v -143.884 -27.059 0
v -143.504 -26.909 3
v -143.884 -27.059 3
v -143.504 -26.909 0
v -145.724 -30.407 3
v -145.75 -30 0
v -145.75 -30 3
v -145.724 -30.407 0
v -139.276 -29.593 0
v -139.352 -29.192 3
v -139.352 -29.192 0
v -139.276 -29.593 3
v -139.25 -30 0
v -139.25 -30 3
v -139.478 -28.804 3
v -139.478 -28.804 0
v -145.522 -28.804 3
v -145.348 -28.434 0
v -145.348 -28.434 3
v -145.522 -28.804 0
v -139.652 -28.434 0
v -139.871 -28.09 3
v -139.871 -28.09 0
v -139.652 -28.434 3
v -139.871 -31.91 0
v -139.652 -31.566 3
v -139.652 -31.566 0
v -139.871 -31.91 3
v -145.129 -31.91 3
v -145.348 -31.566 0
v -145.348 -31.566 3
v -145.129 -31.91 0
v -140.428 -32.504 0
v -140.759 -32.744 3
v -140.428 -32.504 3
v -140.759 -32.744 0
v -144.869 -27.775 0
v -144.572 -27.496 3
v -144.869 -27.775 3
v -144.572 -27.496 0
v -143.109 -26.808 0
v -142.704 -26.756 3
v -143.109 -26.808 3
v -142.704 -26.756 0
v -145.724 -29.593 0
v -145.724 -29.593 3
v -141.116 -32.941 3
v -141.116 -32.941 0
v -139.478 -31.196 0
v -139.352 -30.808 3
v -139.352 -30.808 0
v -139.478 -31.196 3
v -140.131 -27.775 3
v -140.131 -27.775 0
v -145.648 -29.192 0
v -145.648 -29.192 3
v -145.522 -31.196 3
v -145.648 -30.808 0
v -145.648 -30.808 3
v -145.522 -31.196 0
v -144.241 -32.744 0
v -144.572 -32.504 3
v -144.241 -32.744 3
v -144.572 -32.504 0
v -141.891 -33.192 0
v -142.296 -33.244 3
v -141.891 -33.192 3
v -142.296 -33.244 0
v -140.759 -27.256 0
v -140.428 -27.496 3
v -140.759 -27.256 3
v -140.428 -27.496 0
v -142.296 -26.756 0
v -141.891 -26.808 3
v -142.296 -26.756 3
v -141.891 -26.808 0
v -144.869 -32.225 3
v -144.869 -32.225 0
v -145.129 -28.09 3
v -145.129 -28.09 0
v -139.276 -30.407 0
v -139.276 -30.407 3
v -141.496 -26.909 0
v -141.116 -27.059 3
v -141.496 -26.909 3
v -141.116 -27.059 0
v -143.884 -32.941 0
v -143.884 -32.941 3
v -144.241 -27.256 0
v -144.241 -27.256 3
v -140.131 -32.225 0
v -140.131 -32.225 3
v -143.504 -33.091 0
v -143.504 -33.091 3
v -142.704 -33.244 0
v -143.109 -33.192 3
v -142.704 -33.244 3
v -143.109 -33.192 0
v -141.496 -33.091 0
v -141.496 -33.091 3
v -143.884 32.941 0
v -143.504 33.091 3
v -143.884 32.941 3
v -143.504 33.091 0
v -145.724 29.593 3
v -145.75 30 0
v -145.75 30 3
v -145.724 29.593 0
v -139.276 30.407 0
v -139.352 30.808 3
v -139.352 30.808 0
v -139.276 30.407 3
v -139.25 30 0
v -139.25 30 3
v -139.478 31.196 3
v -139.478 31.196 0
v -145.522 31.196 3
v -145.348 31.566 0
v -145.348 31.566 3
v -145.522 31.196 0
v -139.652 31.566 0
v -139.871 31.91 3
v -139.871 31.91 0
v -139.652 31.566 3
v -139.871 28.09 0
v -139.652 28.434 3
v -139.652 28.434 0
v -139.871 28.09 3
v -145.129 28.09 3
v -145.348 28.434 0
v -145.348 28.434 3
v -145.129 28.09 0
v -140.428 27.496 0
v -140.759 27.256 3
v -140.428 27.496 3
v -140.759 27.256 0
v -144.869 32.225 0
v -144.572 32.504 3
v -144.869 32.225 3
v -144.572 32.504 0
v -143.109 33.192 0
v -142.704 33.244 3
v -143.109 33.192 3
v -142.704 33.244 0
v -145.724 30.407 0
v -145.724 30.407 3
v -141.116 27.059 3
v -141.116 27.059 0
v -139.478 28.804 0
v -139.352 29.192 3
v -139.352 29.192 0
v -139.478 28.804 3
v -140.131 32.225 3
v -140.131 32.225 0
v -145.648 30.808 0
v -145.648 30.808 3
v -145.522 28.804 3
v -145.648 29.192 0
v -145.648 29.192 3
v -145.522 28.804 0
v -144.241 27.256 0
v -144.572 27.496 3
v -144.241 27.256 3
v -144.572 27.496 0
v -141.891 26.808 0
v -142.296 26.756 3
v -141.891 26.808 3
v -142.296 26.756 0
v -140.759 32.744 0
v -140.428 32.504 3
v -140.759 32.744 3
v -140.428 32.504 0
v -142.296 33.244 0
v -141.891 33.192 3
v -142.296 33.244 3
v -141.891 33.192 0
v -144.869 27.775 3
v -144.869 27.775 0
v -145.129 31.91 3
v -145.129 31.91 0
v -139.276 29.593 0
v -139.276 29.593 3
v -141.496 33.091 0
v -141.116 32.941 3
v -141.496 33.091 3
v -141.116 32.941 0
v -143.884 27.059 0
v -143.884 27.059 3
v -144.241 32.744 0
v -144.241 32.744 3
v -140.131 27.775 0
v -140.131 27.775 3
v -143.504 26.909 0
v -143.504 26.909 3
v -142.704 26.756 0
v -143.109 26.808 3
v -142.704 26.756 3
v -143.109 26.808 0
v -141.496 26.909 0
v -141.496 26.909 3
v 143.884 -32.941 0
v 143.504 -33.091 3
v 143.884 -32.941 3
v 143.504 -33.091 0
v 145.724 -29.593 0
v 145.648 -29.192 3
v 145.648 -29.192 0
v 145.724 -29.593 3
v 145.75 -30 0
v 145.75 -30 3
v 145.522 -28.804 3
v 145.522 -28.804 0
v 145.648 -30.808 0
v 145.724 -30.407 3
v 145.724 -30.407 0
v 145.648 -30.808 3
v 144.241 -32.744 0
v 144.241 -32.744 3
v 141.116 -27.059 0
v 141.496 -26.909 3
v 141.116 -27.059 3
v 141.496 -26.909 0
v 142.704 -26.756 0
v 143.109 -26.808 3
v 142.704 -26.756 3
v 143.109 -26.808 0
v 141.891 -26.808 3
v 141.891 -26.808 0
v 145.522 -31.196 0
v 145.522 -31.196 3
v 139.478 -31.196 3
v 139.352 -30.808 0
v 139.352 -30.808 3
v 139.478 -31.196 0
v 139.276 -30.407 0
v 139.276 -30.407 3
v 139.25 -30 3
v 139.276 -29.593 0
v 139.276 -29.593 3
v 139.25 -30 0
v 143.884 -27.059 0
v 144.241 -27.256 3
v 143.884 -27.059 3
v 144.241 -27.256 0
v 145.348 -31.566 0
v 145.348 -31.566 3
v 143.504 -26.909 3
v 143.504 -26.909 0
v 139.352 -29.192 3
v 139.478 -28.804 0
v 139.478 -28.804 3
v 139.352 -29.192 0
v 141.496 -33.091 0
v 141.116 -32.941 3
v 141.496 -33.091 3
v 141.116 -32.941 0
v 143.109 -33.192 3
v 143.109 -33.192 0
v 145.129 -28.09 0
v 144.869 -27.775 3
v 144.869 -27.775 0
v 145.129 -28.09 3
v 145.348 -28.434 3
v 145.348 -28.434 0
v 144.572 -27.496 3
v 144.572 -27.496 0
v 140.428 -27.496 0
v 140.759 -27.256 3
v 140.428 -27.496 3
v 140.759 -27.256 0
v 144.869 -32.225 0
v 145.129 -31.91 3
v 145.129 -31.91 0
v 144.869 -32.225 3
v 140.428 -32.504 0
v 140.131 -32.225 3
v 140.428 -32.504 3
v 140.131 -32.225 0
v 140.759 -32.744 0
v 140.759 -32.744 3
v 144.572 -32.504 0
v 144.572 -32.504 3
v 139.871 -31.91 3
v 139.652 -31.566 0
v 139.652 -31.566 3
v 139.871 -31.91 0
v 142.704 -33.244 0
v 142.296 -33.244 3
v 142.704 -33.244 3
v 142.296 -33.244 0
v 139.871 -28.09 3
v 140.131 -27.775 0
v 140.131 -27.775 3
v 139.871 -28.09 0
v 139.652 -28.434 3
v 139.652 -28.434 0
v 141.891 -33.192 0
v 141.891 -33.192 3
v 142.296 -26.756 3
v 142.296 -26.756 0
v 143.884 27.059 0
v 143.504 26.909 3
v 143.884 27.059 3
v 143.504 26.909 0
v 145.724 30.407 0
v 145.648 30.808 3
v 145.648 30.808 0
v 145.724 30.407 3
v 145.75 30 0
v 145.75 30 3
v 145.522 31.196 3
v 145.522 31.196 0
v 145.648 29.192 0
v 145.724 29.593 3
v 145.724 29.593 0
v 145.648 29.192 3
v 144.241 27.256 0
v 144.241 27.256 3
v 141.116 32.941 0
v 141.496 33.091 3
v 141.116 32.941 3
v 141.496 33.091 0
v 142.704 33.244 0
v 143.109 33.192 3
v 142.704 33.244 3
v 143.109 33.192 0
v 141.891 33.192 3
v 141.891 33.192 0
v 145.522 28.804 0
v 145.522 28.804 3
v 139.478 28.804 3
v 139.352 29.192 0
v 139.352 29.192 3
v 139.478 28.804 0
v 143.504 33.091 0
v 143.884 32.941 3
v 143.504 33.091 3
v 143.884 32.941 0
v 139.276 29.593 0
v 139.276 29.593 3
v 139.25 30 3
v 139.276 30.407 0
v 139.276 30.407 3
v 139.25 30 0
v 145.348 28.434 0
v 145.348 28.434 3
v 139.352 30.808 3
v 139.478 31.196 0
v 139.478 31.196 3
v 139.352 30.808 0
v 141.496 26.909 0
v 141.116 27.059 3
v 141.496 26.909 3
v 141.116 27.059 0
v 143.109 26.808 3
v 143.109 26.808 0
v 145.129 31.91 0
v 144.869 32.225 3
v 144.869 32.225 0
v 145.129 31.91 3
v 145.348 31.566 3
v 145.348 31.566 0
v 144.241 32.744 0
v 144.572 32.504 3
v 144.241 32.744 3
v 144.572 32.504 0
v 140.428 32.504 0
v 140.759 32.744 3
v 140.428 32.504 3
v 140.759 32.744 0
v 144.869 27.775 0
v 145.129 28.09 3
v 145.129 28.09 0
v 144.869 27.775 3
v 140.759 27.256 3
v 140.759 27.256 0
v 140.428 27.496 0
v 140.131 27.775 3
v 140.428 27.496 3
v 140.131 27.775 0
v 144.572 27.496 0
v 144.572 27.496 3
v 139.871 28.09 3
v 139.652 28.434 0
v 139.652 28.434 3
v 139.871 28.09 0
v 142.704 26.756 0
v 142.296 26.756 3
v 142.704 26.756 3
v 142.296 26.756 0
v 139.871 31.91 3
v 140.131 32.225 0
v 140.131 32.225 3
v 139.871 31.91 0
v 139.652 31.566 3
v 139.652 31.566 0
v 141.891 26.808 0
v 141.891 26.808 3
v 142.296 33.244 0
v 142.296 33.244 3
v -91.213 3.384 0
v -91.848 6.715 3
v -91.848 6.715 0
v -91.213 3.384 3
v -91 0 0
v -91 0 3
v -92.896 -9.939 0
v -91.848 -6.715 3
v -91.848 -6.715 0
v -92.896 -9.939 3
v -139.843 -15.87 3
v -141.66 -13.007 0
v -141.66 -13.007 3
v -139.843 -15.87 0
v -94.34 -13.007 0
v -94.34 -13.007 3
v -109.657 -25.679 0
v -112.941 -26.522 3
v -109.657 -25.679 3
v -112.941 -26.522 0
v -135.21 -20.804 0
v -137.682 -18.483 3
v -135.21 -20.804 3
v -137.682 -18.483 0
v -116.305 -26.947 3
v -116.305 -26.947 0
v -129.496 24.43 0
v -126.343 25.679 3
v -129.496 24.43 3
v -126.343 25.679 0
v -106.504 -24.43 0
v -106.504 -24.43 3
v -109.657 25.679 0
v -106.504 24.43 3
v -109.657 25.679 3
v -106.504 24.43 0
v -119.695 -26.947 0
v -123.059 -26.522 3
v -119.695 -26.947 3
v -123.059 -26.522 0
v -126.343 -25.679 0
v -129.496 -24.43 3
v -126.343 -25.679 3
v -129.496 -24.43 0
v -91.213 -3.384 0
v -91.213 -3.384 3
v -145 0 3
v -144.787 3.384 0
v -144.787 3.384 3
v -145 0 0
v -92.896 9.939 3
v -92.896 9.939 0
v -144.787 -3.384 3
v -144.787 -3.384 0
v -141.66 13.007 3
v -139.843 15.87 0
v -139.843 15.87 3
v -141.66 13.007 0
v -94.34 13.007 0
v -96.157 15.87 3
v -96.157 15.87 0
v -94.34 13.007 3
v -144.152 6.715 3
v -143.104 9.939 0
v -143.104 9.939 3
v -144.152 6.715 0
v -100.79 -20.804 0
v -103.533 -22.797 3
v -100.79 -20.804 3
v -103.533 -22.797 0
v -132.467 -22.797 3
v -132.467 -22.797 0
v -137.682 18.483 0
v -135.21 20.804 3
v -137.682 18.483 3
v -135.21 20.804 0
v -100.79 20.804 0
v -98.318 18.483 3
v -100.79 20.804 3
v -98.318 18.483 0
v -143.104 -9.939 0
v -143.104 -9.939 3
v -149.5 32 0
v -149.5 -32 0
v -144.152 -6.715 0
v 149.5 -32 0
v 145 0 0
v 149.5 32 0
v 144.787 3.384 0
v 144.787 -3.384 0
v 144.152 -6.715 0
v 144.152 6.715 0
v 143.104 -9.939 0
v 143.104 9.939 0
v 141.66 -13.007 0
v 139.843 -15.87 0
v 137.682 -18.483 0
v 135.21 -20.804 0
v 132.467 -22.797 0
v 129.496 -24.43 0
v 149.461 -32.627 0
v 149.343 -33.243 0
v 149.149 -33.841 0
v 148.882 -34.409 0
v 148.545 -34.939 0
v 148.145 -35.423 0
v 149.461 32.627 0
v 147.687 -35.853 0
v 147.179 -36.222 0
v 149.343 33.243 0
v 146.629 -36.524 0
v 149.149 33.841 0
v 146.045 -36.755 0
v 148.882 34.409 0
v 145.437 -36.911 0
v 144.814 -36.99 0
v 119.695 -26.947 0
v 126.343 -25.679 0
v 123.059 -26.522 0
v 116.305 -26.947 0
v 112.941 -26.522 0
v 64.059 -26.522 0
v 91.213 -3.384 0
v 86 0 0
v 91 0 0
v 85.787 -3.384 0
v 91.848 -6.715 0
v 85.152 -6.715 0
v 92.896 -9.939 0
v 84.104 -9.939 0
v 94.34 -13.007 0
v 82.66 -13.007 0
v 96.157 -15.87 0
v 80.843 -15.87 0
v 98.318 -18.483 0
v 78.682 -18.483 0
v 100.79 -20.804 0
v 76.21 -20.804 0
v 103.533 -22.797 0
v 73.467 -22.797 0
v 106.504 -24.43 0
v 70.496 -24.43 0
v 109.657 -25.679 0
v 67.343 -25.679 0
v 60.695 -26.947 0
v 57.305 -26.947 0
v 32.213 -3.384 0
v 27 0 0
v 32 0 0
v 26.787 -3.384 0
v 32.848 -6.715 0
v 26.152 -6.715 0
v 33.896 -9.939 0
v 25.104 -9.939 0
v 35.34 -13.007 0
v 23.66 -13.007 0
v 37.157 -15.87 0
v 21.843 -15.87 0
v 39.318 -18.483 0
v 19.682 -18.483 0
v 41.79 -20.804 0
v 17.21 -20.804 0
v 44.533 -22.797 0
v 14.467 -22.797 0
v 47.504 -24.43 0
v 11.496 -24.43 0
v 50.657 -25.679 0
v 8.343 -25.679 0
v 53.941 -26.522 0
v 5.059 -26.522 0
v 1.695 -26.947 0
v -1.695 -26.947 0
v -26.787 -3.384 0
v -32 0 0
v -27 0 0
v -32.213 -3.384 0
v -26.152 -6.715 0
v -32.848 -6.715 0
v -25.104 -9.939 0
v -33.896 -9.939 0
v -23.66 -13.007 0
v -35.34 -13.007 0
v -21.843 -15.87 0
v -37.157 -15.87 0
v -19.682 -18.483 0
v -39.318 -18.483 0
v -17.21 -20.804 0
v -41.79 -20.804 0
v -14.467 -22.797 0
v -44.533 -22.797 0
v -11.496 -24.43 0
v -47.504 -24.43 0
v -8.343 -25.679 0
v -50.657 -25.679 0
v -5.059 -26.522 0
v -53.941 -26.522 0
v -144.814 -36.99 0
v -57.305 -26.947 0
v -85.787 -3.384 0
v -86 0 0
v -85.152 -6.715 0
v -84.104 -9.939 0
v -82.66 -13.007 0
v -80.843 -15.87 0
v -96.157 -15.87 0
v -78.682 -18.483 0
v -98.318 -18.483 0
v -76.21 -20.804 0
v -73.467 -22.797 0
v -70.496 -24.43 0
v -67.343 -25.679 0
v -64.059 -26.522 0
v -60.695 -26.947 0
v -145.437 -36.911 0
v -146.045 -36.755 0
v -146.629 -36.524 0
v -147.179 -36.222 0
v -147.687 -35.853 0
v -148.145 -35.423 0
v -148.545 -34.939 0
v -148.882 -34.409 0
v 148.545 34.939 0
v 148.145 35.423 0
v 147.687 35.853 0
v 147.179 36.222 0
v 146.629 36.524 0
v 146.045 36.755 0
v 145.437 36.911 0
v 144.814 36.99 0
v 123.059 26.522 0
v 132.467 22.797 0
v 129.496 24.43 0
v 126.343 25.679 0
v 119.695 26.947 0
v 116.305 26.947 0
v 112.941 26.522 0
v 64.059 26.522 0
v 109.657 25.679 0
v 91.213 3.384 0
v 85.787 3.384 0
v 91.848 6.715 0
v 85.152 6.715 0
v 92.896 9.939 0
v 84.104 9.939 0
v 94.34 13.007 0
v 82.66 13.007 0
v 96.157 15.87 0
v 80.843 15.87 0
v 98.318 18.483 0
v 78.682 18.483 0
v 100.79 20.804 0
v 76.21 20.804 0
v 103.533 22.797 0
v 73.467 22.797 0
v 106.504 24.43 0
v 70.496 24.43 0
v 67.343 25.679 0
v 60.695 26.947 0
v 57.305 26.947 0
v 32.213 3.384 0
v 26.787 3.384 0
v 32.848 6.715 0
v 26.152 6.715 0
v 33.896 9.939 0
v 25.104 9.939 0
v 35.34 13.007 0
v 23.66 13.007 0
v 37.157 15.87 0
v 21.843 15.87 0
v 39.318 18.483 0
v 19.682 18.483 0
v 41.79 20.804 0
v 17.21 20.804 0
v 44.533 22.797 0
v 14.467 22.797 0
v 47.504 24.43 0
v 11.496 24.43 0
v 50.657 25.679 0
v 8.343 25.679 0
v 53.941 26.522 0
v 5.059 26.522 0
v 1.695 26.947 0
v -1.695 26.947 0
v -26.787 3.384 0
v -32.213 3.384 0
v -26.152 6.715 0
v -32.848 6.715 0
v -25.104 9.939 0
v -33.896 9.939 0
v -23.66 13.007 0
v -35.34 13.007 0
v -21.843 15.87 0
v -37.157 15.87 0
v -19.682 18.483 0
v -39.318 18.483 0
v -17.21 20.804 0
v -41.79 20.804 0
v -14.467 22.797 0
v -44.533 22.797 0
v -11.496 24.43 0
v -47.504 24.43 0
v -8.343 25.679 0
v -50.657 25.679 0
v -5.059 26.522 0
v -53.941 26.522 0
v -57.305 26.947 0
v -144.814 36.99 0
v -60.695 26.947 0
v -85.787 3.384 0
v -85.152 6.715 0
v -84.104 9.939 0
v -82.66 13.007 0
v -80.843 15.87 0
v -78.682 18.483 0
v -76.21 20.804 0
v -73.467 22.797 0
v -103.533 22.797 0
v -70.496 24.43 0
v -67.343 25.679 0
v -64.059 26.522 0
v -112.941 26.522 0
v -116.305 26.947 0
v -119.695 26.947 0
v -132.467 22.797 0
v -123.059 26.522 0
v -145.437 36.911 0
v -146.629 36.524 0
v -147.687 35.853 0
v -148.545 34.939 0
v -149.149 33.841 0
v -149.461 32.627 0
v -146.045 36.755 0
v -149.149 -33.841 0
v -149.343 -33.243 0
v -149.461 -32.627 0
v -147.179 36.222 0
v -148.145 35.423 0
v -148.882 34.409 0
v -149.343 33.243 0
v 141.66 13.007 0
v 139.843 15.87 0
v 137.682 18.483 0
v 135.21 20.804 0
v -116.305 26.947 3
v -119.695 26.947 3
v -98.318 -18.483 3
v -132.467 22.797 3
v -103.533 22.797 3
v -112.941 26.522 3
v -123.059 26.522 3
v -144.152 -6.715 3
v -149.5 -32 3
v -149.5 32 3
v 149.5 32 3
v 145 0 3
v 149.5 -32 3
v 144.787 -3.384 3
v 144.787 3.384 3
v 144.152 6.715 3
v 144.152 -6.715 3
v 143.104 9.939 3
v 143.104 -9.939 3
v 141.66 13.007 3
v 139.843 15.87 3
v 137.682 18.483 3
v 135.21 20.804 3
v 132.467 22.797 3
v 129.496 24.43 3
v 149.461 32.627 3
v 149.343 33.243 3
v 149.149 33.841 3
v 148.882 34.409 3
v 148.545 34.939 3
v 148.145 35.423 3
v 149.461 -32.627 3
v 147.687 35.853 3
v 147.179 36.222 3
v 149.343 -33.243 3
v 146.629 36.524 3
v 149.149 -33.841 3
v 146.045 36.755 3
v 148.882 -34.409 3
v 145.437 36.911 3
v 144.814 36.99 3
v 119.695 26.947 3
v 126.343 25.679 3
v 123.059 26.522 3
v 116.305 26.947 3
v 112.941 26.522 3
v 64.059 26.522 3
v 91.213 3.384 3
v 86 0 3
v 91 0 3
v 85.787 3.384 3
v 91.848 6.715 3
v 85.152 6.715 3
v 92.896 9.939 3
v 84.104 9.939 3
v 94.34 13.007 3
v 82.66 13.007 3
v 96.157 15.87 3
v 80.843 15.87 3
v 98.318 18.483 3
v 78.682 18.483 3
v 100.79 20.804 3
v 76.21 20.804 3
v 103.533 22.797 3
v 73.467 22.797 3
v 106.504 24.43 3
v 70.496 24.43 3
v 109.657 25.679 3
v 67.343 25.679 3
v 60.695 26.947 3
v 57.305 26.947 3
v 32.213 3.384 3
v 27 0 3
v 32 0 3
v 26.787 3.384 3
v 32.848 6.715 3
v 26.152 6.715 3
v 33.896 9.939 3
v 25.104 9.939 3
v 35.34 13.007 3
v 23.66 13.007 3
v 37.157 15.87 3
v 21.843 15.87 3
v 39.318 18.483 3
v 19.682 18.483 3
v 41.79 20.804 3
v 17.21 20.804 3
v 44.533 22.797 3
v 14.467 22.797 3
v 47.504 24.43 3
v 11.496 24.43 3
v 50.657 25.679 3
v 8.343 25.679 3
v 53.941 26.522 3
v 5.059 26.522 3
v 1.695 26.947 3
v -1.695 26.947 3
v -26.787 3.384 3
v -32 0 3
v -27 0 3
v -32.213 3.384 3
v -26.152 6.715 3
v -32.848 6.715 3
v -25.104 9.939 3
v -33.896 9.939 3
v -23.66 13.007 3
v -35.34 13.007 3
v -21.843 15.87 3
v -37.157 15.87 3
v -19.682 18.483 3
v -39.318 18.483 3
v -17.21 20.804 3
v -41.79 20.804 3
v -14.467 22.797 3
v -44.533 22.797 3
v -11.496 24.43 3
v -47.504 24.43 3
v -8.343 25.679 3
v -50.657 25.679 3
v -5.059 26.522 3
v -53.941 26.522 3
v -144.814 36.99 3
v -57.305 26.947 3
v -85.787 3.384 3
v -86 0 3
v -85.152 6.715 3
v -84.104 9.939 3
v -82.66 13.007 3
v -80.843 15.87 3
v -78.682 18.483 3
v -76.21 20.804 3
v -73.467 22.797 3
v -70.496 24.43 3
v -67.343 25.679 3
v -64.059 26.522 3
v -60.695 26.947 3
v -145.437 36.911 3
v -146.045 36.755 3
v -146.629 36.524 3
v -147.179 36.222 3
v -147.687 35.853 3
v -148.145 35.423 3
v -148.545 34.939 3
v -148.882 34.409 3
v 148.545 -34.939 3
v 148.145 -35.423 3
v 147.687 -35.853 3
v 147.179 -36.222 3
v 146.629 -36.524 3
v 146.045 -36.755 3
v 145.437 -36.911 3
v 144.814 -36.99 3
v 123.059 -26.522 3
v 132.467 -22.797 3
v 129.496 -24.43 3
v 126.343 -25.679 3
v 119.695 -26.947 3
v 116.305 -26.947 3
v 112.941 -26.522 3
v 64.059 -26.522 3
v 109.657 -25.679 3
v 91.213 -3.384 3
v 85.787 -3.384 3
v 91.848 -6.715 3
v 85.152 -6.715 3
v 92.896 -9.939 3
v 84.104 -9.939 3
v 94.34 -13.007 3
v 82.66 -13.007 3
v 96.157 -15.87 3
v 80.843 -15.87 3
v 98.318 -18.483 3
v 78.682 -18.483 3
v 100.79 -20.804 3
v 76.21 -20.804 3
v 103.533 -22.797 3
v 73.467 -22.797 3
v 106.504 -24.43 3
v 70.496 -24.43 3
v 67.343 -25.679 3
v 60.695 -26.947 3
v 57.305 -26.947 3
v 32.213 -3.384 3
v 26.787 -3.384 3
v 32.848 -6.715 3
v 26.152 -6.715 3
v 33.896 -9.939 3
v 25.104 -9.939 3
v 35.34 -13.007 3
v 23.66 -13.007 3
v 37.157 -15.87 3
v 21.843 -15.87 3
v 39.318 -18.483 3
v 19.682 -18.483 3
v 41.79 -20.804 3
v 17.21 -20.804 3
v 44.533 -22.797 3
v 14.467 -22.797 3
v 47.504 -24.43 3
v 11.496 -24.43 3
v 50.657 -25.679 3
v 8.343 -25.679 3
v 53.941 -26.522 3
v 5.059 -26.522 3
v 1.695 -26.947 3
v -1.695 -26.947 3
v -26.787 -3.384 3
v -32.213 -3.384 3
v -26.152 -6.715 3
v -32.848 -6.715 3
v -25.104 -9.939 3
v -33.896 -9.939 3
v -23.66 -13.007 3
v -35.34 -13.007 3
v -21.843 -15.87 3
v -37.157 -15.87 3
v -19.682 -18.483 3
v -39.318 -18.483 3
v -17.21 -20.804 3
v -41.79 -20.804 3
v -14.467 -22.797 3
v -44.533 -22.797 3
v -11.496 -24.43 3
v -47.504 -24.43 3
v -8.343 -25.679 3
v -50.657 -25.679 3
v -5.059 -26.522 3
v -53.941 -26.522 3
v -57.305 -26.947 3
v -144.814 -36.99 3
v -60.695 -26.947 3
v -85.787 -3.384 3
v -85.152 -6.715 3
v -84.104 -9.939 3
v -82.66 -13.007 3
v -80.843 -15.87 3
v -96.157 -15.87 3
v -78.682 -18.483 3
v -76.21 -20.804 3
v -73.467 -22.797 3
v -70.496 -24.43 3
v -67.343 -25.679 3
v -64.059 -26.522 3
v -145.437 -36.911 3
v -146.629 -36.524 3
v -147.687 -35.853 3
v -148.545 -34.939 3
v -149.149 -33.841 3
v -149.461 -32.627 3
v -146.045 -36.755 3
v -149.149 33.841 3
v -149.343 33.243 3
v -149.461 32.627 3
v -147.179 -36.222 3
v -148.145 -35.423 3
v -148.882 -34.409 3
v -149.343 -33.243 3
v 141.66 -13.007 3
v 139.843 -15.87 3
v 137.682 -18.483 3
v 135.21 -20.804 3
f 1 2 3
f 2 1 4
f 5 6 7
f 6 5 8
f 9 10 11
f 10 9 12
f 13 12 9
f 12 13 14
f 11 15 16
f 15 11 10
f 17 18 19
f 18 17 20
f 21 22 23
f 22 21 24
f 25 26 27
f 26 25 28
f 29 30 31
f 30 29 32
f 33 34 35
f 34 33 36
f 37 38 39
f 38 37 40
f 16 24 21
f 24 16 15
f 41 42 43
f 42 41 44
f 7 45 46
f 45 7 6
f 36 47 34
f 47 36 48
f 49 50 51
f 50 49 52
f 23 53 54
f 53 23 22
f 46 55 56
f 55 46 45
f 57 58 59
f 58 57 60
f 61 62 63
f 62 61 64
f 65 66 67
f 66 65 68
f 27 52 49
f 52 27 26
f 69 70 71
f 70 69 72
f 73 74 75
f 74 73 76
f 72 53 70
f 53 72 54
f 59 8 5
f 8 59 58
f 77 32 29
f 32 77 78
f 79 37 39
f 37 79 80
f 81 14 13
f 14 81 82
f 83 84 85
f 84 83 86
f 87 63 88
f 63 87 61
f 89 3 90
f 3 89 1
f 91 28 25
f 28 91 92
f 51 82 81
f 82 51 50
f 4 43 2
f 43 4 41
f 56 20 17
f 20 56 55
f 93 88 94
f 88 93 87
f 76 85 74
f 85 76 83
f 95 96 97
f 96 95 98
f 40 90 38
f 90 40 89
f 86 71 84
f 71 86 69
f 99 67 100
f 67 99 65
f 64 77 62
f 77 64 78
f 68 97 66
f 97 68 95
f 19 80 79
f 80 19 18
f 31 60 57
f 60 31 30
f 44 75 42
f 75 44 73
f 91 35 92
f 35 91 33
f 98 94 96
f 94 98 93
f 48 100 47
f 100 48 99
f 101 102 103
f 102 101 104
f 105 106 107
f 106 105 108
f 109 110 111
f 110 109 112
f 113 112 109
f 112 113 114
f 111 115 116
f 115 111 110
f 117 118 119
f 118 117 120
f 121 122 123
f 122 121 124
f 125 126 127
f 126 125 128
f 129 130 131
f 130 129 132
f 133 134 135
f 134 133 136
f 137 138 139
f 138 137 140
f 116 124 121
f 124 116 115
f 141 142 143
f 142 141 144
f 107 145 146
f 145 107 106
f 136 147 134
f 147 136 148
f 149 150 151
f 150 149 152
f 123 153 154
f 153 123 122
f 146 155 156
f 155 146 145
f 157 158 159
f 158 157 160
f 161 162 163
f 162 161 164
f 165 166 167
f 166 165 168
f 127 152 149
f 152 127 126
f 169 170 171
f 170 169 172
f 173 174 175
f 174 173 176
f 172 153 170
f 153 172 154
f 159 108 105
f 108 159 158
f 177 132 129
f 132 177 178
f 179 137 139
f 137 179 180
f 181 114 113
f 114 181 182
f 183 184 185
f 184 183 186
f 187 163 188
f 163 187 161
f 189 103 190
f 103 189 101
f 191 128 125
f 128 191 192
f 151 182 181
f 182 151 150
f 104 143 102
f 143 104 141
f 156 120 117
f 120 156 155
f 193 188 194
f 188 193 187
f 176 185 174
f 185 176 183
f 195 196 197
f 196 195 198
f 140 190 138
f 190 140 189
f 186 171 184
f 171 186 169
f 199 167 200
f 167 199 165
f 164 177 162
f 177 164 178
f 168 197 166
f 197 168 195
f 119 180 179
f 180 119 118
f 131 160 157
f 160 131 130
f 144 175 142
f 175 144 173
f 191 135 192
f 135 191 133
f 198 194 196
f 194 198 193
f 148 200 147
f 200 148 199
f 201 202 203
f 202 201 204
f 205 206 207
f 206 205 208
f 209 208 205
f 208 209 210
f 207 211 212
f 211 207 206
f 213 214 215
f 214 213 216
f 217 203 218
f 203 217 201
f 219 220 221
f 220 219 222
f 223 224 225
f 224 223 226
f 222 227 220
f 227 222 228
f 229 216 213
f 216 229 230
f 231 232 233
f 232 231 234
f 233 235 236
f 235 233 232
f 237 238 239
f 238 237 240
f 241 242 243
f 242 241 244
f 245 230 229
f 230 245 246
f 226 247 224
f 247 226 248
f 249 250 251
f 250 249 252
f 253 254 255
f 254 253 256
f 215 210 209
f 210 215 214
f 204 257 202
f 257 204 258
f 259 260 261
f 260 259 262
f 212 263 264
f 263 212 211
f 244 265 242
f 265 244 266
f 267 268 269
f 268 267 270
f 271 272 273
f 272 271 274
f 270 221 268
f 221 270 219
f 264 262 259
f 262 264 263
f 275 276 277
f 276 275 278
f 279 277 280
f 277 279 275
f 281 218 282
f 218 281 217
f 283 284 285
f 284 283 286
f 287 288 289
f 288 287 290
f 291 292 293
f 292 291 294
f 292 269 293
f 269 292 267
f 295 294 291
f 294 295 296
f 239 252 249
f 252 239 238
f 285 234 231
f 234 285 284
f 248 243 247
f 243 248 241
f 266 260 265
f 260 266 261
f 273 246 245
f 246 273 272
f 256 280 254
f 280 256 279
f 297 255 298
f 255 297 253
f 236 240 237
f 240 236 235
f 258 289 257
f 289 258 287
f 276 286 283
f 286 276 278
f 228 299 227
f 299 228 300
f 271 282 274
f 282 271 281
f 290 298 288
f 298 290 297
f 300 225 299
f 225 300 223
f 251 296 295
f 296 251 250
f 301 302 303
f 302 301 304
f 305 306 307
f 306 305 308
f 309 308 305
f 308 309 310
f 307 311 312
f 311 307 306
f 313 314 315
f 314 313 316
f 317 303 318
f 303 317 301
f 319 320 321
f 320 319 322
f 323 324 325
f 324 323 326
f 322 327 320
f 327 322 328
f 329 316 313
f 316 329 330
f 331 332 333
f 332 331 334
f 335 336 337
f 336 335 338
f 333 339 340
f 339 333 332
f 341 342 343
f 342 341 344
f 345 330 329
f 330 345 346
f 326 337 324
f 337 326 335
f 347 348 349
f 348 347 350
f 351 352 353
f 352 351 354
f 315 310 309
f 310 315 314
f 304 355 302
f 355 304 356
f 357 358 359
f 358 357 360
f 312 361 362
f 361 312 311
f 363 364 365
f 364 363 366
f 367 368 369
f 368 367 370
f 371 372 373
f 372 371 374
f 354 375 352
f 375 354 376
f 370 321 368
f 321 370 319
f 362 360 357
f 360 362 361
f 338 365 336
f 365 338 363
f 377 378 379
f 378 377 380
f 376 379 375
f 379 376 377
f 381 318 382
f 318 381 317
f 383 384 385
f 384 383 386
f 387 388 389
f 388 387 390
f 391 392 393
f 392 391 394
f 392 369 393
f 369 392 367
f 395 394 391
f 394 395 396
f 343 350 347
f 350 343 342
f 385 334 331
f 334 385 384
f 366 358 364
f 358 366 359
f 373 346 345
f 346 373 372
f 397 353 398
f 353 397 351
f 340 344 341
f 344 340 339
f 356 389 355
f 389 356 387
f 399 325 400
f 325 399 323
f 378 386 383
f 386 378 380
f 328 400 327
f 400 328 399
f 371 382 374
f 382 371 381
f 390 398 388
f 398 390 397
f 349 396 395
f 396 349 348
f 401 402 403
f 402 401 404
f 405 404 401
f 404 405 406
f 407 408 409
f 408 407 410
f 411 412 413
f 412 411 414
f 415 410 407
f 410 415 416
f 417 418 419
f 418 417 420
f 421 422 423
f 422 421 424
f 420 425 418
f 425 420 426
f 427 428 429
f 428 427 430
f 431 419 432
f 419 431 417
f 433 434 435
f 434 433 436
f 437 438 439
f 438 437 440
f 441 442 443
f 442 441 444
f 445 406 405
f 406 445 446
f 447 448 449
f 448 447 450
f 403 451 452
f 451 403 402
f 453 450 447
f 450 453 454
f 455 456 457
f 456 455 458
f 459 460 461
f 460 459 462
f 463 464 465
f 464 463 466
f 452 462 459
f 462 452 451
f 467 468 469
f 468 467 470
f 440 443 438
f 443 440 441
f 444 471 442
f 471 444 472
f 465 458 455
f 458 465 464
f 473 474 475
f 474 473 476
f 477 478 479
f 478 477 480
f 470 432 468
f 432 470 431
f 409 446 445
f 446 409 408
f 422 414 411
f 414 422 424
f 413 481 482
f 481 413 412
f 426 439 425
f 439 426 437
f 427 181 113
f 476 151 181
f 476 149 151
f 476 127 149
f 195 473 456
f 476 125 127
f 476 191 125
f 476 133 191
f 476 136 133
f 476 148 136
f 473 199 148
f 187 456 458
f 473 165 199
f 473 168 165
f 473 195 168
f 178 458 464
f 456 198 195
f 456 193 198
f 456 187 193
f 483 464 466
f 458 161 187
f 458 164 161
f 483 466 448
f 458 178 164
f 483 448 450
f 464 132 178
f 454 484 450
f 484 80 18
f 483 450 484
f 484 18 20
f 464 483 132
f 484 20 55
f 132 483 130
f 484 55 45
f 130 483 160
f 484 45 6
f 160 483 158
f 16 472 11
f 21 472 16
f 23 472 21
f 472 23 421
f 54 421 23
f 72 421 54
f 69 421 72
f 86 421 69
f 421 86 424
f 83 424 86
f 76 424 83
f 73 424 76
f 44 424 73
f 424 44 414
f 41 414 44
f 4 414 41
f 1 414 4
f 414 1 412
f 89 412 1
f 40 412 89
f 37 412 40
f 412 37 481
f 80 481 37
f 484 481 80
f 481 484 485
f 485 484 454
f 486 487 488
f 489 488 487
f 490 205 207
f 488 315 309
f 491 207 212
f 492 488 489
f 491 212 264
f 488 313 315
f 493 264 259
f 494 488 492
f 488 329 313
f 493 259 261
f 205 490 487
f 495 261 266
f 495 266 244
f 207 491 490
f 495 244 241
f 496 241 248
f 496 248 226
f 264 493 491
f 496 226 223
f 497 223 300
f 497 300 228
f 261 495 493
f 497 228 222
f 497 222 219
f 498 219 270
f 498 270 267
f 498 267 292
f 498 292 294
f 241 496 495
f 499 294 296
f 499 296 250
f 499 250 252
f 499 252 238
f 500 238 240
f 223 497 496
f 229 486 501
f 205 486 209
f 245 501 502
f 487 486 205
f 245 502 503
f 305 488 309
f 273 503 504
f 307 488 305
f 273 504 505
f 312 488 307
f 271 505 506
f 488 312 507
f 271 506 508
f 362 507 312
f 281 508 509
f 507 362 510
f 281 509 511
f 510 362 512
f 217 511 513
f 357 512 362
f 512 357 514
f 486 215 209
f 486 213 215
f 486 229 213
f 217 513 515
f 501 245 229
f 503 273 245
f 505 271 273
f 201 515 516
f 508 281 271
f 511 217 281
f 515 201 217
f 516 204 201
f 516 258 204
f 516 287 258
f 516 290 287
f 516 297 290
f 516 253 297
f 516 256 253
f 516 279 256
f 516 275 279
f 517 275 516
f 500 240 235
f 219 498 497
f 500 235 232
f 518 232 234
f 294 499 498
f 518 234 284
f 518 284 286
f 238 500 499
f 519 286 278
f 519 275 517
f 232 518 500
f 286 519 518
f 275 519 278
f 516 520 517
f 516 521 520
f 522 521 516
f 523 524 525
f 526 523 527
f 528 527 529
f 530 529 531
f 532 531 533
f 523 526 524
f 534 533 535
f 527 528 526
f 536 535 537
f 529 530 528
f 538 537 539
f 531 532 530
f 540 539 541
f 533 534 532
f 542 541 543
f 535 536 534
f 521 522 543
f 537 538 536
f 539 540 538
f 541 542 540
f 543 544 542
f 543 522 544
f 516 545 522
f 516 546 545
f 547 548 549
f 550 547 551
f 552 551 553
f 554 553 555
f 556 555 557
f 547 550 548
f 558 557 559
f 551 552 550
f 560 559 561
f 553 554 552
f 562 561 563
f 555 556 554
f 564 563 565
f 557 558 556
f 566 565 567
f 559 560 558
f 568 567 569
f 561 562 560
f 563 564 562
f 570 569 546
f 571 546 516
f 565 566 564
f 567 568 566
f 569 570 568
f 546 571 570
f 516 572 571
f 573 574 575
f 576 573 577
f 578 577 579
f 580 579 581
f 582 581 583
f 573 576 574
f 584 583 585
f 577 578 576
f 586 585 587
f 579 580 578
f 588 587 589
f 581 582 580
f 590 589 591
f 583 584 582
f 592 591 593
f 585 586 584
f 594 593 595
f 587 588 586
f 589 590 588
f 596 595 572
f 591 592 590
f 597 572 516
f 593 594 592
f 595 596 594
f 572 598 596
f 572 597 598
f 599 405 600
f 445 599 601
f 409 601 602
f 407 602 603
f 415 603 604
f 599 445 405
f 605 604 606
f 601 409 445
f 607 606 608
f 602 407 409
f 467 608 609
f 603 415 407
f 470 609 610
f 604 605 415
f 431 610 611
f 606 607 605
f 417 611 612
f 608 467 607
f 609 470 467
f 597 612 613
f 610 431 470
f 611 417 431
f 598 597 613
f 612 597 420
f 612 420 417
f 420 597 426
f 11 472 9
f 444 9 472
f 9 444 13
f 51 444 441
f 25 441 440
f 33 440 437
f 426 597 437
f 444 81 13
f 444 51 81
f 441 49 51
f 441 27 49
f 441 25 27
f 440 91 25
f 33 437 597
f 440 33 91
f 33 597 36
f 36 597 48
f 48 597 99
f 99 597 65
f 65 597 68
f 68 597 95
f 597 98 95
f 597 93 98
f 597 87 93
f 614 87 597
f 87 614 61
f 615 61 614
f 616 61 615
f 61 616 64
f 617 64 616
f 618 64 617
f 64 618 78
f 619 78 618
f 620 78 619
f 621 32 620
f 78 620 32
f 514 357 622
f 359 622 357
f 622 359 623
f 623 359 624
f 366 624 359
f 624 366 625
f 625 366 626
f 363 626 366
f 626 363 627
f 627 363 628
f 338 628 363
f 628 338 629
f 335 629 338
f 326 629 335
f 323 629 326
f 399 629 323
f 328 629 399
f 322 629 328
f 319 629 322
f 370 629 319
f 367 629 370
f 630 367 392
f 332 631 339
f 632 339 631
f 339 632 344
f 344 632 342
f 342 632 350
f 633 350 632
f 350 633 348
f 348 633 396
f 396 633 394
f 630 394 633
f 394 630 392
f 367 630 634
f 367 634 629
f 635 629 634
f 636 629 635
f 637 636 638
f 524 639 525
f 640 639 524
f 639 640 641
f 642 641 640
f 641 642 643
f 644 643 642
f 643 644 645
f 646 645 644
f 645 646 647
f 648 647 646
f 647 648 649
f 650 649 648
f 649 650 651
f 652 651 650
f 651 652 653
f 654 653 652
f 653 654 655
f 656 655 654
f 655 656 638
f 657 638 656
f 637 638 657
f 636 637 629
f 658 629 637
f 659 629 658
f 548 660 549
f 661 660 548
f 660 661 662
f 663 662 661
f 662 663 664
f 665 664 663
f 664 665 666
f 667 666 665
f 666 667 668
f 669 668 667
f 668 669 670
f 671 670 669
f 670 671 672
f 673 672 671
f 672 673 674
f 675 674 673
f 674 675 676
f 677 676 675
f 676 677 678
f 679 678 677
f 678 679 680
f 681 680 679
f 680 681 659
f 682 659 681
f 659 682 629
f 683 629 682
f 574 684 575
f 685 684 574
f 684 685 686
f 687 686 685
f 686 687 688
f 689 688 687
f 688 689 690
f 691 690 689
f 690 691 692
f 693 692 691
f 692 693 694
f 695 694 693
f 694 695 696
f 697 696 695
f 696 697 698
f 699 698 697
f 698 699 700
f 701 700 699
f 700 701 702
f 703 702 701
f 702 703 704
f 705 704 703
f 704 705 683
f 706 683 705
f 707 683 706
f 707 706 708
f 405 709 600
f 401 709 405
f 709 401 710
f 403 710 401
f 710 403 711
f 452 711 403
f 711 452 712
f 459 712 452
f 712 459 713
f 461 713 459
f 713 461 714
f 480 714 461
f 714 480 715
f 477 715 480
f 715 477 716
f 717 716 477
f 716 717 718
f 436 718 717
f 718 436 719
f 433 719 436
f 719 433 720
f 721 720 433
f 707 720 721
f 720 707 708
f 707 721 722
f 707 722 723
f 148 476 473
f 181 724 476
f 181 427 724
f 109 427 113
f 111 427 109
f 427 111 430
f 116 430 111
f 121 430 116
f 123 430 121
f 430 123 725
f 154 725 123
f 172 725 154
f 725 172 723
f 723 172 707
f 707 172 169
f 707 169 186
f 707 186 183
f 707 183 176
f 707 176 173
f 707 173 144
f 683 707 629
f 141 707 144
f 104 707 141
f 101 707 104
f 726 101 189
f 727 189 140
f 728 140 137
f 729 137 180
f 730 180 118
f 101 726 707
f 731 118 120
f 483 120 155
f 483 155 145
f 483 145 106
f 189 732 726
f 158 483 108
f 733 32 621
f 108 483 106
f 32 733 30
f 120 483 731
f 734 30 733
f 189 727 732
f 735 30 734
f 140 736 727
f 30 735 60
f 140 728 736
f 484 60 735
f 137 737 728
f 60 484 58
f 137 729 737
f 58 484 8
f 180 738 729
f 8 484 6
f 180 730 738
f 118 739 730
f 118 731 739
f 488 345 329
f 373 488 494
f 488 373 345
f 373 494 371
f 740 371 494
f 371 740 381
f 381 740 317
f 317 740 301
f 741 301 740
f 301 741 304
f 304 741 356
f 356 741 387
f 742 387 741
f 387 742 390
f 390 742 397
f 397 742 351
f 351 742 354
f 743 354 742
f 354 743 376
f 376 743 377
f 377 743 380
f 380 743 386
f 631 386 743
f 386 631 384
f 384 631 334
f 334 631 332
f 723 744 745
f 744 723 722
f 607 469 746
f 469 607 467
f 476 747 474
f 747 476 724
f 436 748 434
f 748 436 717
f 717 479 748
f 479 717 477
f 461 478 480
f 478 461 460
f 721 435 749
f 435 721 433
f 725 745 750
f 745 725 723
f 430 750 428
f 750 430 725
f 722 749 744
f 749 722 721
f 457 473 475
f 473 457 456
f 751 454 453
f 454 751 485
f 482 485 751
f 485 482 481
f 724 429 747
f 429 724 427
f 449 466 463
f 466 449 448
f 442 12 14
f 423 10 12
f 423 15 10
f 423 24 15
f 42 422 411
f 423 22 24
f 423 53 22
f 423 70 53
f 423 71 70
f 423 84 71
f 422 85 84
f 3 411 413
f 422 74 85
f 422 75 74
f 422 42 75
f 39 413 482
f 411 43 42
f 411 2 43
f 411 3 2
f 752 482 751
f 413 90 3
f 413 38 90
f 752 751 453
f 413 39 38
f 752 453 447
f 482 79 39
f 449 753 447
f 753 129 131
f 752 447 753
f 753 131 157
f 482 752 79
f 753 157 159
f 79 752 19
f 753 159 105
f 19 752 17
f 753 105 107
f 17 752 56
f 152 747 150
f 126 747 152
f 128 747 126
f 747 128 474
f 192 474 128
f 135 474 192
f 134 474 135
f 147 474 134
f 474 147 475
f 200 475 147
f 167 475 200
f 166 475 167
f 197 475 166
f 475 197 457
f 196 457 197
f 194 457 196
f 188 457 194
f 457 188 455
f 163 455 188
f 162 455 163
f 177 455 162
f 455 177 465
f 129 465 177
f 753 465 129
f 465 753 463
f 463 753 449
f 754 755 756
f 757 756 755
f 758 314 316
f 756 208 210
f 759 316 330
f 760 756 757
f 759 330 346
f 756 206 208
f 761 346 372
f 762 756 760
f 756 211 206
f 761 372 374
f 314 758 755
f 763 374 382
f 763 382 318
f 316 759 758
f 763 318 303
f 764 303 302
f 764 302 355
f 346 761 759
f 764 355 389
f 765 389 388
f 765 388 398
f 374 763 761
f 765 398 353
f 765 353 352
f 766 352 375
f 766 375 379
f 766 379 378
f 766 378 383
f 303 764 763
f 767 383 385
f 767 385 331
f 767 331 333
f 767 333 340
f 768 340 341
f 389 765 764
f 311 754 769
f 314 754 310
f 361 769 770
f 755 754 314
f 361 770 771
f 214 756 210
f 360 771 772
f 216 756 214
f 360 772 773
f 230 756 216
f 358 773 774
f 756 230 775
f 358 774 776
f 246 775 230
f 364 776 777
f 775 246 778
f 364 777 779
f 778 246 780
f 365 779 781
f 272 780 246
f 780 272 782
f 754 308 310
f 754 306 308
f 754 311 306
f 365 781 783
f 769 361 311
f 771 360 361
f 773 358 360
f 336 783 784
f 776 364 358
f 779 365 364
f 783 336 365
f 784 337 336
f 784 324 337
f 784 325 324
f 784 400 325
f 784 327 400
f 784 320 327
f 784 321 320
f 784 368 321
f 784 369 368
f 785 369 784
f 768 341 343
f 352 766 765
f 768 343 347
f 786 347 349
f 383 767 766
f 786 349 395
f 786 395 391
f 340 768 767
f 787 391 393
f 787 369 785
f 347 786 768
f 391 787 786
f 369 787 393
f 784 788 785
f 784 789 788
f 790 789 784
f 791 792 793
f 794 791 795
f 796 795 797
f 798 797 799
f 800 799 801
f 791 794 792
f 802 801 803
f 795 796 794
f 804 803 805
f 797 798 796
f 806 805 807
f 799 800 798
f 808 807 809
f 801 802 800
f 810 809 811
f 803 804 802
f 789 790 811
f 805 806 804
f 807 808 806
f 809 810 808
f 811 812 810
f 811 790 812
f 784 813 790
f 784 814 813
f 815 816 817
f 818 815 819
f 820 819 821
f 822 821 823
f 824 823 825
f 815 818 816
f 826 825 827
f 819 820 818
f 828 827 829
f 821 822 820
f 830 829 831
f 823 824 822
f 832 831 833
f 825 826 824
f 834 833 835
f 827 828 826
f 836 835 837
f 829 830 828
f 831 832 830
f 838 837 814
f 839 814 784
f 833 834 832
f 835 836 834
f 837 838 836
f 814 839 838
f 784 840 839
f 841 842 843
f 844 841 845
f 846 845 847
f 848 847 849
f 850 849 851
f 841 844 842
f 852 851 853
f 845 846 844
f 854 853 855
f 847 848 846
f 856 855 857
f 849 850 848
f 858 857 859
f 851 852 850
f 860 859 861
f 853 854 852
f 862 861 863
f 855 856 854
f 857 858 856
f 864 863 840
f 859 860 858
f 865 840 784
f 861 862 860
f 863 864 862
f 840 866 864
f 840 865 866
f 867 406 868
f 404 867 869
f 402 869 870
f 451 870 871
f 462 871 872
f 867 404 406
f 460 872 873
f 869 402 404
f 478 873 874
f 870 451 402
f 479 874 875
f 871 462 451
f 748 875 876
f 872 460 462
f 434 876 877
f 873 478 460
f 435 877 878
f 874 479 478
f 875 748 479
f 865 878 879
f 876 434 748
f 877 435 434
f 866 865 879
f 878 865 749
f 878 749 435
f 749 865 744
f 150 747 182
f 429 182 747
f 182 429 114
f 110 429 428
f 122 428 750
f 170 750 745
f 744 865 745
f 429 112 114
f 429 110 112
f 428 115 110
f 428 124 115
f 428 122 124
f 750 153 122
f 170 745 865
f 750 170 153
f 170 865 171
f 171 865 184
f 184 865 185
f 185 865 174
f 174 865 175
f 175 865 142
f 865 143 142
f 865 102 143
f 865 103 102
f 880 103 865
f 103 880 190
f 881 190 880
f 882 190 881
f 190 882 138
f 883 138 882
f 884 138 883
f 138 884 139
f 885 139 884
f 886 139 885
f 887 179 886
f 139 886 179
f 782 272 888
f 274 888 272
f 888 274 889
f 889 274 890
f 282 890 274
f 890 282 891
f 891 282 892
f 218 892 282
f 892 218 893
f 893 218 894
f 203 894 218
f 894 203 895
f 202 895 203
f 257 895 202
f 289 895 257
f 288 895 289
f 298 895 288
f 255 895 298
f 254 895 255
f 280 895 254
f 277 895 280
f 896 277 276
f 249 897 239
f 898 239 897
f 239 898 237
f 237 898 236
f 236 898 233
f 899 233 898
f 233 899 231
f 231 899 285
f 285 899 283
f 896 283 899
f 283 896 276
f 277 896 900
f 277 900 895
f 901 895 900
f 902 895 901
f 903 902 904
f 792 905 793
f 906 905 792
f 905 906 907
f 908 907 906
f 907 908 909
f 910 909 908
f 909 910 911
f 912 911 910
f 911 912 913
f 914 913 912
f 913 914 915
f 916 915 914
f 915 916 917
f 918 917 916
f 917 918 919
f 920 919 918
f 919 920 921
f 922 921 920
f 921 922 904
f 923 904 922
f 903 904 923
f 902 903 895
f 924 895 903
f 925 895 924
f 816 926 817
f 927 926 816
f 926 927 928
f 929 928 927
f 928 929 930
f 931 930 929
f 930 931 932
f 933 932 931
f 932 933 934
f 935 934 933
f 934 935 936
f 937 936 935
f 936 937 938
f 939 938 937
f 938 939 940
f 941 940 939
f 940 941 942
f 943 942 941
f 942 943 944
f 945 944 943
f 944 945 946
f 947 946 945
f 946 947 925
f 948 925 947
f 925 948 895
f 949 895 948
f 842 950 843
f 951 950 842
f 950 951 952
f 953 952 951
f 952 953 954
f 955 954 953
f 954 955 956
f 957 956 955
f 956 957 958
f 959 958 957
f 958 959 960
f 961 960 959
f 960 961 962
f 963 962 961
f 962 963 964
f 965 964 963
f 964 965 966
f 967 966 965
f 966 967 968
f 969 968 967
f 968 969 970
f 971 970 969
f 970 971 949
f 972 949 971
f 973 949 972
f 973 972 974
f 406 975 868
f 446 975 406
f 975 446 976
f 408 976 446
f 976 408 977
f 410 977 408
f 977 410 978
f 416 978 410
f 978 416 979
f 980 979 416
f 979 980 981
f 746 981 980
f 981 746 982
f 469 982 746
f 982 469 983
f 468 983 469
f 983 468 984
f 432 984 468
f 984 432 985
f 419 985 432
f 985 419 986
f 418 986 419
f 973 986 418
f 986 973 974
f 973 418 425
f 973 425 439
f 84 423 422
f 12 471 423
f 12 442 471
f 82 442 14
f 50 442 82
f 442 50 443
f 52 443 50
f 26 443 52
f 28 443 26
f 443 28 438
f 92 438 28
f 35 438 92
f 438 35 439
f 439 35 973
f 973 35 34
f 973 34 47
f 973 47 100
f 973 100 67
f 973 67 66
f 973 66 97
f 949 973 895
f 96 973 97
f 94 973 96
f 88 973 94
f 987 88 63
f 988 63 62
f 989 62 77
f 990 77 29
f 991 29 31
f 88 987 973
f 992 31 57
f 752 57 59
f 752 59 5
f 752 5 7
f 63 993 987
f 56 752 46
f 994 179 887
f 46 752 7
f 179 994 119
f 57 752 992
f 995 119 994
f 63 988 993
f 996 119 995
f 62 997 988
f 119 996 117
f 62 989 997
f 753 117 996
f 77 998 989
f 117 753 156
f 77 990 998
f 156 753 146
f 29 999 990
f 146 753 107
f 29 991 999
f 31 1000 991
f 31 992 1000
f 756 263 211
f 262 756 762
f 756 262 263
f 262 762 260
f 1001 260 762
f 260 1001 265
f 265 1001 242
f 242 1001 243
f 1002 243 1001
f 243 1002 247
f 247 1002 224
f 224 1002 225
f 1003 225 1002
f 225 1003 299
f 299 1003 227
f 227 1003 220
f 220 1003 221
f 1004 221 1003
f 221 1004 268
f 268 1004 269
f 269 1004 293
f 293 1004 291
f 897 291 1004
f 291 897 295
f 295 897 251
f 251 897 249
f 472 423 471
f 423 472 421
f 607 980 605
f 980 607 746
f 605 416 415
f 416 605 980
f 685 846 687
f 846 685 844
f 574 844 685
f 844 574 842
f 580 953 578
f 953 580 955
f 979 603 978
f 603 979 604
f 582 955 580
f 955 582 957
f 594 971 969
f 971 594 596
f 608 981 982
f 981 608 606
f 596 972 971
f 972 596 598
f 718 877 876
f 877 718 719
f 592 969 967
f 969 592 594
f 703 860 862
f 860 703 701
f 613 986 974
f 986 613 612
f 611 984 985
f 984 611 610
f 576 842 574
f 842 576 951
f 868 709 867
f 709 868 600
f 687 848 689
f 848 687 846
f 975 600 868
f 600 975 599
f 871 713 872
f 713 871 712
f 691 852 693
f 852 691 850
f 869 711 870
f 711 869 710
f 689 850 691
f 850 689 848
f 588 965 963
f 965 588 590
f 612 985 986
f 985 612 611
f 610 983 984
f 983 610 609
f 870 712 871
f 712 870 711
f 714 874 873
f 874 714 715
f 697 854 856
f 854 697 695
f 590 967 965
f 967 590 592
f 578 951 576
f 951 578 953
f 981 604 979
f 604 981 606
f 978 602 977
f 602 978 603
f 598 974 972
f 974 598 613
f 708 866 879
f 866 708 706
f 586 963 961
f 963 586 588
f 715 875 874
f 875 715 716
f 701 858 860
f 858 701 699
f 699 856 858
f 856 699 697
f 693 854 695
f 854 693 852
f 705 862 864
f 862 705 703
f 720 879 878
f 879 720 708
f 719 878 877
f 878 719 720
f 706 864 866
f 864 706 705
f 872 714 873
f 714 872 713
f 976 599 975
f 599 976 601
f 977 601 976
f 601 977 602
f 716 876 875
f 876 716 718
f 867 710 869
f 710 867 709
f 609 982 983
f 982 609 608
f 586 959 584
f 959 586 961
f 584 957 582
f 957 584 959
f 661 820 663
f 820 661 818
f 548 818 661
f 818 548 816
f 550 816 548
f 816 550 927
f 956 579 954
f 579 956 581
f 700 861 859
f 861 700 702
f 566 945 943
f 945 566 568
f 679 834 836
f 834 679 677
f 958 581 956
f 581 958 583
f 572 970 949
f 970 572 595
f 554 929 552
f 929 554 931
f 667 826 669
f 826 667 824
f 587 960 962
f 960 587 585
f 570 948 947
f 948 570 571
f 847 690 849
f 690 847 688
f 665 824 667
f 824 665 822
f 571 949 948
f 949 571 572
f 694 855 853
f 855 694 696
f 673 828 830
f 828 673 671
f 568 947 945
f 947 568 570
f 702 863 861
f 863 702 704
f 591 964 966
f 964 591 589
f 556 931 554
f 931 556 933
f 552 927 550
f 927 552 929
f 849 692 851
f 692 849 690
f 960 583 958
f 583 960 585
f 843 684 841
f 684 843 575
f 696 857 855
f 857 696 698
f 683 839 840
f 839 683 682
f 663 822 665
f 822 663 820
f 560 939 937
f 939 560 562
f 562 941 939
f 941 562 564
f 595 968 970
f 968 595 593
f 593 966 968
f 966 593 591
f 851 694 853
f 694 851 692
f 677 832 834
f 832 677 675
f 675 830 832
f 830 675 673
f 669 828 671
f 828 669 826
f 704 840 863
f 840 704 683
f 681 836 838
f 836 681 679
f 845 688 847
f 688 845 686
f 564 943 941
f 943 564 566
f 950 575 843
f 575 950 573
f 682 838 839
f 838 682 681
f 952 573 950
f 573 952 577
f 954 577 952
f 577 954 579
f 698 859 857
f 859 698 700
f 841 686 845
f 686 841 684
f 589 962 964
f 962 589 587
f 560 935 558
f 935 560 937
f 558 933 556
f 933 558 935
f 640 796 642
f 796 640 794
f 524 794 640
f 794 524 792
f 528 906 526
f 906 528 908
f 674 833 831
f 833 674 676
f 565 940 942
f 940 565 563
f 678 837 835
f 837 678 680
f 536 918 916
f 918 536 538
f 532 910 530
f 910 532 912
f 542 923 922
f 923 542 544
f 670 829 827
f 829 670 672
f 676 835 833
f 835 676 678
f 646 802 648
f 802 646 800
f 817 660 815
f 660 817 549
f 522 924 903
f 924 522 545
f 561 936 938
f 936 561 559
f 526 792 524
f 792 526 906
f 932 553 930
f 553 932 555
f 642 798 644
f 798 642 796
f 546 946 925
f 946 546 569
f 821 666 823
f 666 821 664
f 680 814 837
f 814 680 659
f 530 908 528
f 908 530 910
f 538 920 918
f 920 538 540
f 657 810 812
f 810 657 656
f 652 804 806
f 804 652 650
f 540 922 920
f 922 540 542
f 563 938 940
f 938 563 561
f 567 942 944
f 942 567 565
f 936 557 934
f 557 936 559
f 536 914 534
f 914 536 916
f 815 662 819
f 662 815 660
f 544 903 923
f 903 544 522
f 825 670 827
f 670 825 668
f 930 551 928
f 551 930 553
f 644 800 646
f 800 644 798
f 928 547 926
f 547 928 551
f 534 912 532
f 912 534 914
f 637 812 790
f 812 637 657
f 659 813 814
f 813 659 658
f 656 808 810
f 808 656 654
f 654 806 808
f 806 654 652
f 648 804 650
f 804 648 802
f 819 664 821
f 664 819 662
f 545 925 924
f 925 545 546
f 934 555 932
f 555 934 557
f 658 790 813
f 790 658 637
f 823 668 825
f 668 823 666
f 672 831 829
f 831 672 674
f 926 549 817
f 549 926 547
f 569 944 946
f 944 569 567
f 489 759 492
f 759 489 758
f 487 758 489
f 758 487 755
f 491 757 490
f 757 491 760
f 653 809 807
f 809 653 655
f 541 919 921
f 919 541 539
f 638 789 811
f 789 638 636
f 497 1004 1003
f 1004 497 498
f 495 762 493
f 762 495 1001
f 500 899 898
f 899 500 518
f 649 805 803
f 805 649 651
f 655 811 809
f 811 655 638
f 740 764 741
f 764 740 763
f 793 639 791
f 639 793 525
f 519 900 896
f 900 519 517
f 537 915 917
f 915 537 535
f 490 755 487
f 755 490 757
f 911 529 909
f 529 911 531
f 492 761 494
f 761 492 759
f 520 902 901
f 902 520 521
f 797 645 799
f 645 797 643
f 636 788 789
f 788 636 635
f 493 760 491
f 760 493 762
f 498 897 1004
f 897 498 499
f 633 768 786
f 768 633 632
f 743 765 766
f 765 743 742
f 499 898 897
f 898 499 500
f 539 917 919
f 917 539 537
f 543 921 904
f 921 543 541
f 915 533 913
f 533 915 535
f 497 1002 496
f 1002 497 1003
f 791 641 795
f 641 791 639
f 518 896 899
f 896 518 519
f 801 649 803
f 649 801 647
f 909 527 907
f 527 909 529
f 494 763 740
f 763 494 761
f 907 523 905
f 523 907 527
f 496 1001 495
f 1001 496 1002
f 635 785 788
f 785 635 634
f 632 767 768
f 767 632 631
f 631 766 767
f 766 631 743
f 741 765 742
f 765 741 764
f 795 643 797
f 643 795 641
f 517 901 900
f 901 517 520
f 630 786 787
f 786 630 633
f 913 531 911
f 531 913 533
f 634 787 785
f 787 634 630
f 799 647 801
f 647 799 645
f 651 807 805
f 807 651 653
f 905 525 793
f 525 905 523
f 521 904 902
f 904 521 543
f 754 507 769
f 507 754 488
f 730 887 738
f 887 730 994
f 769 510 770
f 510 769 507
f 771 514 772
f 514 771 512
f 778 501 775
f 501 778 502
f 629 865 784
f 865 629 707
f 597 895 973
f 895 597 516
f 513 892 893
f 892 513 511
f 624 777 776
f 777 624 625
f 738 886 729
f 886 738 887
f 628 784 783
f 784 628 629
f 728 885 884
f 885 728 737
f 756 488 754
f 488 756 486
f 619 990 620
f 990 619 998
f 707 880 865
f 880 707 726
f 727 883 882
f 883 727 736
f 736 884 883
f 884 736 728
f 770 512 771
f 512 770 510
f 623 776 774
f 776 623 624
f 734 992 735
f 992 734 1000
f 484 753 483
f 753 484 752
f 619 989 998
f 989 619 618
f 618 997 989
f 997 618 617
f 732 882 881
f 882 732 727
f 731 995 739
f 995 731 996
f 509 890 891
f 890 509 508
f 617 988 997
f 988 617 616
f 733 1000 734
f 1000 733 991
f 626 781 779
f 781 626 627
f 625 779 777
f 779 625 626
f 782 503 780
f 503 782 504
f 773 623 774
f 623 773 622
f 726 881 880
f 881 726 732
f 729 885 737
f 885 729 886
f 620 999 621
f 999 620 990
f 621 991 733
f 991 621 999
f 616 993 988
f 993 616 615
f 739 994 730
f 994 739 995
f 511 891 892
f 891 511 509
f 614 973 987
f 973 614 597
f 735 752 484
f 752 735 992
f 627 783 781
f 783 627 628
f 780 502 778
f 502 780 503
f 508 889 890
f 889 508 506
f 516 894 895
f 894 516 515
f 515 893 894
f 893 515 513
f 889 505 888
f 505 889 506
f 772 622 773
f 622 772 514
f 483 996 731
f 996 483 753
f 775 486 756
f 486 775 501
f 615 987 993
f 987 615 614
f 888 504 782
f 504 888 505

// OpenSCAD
$fn = 50;

difference() {
	union() {
		hull() {
			translate(v = [-144.5, 32.0, 0]) {
				cylinder(h = 3, r = 5);
			}
			translate(v = [144.5, 32.0, 0]) {
				cylinder(h = 3, r = 5);
			}
			translate(v = [-144.5, -32.0, 0]) {
				cylinder(h = 3, r = 5);
			}
			translate(v = [144.5, -32.0, 0]) {
				cylinder(h = 3, r = 5);
			}
		}
	}
	union() {
		translate(v = [-142.5, -30.0, -100.0]) {
			cylinder(h = 200, r = 3.25);
		}
		translate(v = [-142.5, 30.0, -100.0]) {
			cylinder(h = 200, r = 3.25);
		}
		translate(v = [142.5, -30.0, -100.0]) {
			cylinder(h = 200, r = 3.25);
		}
		translate(v = [142.5, 30.0, -100.0]) {
			cylinder(h = 200, r = 3.25);
		}
		translate(v = [-142.5, -30.0, -100.0]) {
			cylinder(h = 200, r = 1.8);
		}
		translate(v = [-142.5, 30.0, -100.0]) {
			cylinder(h = 200, r = 1.8);
		}
		translate(v = [142.5, -30.0, -100.0]) {
			cylinder(h = 200, r = 1.8);
		}
		translate(v = [142.5, 30.0, -100.0]) {
			cylinder(h = 200, r = 1.8);
		}
		translate(v = [-118.0, 0, 0.0]) {
			cylinder(h = 3, r = 27.0);
		}
		translate(v = [-59.0, 0, 0.0]) {
			cylinder(h = 3, r = 27.0);
		}
		cylinder(h = 3, r = 27.0);
		translate(v = [59.0, 0, 0.0]) {
			cylinder(h = 3, r = 27.0);
		}
		translate(v = [118.0, 0, 0.0]) {
			cylinder(h = 3, r = 27.0);
		}
	}
}
